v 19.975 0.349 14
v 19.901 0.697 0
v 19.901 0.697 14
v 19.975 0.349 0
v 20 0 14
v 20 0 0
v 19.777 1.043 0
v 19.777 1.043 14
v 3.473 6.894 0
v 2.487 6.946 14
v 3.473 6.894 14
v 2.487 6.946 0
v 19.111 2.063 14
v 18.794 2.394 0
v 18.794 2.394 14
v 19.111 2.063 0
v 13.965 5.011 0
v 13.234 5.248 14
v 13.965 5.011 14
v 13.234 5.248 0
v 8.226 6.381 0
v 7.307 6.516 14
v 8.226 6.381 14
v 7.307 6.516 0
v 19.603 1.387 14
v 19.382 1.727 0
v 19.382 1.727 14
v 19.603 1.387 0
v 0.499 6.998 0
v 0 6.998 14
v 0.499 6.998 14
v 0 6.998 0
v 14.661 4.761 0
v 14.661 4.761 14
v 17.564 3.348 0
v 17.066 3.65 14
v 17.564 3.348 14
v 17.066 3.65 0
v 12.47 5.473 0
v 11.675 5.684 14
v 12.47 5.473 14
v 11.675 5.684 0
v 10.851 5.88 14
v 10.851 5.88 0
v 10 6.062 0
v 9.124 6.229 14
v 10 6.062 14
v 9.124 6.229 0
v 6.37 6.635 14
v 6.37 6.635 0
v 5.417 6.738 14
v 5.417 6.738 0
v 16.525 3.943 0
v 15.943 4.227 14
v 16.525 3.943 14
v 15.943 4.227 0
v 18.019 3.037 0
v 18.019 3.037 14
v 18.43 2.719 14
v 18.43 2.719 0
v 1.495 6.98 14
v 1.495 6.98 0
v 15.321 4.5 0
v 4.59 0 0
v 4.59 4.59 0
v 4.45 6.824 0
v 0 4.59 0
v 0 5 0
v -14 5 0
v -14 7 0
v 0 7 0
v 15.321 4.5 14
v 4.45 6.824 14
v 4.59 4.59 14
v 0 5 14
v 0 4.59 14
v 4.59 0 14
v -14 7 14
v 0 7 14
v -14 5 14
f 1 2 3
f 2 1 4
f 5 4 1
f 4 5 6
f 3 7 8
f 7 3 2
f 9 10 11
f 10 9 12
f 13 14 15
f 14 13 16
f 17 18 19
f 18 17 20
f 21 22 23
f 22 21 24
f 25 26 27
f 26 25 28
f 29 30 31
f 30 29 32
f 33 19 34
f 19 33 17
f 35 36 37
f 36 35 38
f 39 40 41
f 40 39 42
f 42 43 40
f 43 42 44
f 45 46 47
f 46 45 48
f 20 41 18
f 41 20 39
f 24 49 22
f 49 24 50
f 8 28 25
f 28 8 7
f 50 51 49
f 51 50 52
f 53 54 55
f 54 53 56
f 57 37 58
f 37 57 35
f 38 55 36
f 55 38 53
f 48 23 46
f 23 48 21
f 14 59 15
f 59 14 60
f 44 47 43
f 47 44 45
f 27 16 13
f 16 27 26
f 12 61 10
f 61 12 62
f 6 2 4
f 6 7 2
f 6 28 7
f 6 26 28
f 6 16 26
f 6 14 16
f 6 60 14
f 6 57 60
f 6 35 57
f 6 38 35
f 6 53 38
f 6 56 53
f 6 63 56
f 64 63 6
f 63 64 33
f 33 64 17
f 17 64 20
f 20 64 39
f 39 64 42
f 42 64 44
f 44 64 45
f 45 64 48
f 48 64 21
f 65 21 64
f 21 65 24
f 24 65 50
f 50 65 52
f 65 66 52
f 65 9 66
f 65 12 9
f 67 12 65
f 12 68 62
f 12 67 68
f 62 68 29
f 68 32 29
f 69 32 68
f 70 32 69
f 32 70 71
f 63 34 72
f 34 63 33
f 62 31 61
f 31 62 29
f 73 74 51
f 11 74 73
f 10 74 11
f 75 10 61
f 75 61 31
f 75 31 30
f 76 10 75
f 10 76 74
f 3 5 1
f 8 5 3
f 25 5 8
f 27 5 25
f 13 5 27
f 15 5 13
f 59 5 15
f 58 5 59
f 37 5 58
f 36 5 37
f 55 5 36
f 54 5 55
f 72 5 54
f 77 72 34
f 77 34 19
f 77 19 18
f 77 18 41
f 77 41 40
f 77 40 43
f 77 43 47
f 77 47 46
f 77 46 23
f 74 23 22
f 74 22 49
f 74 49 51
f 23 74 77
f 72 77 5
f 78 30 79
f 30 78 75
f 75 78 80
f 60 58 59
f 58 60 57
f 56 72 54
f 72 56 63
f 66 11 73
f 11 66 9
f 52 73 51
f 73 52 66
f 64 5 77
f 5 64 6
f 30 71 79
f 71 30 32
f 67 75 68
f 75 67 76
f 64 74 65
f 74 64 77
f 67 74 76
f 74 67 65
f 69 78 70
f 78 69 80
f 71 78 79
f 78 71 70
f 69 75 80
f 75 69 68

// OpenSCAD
// Use partname to control which object is being rendered:
//
// _partname_values clip
partname = "display";

// Size of ledge to hold on to: ~15mm wide
ledge_width = 14;
// how far out to stretch the rounded part:
bend_length = 20;
// how high above the base does the ledge go?
ledge_height = 5;
// how much wall thickness should the ledged part have?
ledge_part_thickness = 2;
// Cable diameter around 4mm
cable_r = 2.3;
// Clip width, to fit (and conceal) 9mm double-adhesive tape:
clip_width = 14;

// $fa is the minimum angle for a fragment. Minimum value is 0.01.
$fa = 2;
// $fs is the minimum size of a fragment. If high, causes
// fewer-than-$fa-would-indicate surfaces. Minimum is 0.01.
$fs = 1;

module clip()
{
  difference()
  {
    scale([1.0,(ledge_height+ledge_part_thickness)/bend_length,1.0])
      cylinder(r=bend_length,h=clip_width);
    // cut out bottom:
    translate([-bend_length,-bend_length,-clip_width])
      cube([2*bend_length,bend_length,3*clip_width]);
    // cut out left side:
    translate([-bend_length,-bend_length,-clip_width])
      cube([bend_length,3*bend_length,3*clip_width]);
    // cut out cable channel:
    translate([-0.01,-0.01,-clip_width])
      cube([2*cable_r,2*cable_r,3*clip_width]);
  }
  // add ledge:
  translate([-ledge_width,ledge_height,0])
    cube([ledge_width,ledge_part_thickness,clip_width]);
}


// Conventions:
// * When an object is rendered using partname, position/rotate it according to
//   printing suggestion, here. (The module itself will be positioned/rotated
//   like it will be, in the put-together "display" situation.)
// * The special value "display" for partname is the product picture for all
//   parts put together.
if ("display" == partname)
{
  clip();
} else if ("clip" == partname)
{
  clip();
}
